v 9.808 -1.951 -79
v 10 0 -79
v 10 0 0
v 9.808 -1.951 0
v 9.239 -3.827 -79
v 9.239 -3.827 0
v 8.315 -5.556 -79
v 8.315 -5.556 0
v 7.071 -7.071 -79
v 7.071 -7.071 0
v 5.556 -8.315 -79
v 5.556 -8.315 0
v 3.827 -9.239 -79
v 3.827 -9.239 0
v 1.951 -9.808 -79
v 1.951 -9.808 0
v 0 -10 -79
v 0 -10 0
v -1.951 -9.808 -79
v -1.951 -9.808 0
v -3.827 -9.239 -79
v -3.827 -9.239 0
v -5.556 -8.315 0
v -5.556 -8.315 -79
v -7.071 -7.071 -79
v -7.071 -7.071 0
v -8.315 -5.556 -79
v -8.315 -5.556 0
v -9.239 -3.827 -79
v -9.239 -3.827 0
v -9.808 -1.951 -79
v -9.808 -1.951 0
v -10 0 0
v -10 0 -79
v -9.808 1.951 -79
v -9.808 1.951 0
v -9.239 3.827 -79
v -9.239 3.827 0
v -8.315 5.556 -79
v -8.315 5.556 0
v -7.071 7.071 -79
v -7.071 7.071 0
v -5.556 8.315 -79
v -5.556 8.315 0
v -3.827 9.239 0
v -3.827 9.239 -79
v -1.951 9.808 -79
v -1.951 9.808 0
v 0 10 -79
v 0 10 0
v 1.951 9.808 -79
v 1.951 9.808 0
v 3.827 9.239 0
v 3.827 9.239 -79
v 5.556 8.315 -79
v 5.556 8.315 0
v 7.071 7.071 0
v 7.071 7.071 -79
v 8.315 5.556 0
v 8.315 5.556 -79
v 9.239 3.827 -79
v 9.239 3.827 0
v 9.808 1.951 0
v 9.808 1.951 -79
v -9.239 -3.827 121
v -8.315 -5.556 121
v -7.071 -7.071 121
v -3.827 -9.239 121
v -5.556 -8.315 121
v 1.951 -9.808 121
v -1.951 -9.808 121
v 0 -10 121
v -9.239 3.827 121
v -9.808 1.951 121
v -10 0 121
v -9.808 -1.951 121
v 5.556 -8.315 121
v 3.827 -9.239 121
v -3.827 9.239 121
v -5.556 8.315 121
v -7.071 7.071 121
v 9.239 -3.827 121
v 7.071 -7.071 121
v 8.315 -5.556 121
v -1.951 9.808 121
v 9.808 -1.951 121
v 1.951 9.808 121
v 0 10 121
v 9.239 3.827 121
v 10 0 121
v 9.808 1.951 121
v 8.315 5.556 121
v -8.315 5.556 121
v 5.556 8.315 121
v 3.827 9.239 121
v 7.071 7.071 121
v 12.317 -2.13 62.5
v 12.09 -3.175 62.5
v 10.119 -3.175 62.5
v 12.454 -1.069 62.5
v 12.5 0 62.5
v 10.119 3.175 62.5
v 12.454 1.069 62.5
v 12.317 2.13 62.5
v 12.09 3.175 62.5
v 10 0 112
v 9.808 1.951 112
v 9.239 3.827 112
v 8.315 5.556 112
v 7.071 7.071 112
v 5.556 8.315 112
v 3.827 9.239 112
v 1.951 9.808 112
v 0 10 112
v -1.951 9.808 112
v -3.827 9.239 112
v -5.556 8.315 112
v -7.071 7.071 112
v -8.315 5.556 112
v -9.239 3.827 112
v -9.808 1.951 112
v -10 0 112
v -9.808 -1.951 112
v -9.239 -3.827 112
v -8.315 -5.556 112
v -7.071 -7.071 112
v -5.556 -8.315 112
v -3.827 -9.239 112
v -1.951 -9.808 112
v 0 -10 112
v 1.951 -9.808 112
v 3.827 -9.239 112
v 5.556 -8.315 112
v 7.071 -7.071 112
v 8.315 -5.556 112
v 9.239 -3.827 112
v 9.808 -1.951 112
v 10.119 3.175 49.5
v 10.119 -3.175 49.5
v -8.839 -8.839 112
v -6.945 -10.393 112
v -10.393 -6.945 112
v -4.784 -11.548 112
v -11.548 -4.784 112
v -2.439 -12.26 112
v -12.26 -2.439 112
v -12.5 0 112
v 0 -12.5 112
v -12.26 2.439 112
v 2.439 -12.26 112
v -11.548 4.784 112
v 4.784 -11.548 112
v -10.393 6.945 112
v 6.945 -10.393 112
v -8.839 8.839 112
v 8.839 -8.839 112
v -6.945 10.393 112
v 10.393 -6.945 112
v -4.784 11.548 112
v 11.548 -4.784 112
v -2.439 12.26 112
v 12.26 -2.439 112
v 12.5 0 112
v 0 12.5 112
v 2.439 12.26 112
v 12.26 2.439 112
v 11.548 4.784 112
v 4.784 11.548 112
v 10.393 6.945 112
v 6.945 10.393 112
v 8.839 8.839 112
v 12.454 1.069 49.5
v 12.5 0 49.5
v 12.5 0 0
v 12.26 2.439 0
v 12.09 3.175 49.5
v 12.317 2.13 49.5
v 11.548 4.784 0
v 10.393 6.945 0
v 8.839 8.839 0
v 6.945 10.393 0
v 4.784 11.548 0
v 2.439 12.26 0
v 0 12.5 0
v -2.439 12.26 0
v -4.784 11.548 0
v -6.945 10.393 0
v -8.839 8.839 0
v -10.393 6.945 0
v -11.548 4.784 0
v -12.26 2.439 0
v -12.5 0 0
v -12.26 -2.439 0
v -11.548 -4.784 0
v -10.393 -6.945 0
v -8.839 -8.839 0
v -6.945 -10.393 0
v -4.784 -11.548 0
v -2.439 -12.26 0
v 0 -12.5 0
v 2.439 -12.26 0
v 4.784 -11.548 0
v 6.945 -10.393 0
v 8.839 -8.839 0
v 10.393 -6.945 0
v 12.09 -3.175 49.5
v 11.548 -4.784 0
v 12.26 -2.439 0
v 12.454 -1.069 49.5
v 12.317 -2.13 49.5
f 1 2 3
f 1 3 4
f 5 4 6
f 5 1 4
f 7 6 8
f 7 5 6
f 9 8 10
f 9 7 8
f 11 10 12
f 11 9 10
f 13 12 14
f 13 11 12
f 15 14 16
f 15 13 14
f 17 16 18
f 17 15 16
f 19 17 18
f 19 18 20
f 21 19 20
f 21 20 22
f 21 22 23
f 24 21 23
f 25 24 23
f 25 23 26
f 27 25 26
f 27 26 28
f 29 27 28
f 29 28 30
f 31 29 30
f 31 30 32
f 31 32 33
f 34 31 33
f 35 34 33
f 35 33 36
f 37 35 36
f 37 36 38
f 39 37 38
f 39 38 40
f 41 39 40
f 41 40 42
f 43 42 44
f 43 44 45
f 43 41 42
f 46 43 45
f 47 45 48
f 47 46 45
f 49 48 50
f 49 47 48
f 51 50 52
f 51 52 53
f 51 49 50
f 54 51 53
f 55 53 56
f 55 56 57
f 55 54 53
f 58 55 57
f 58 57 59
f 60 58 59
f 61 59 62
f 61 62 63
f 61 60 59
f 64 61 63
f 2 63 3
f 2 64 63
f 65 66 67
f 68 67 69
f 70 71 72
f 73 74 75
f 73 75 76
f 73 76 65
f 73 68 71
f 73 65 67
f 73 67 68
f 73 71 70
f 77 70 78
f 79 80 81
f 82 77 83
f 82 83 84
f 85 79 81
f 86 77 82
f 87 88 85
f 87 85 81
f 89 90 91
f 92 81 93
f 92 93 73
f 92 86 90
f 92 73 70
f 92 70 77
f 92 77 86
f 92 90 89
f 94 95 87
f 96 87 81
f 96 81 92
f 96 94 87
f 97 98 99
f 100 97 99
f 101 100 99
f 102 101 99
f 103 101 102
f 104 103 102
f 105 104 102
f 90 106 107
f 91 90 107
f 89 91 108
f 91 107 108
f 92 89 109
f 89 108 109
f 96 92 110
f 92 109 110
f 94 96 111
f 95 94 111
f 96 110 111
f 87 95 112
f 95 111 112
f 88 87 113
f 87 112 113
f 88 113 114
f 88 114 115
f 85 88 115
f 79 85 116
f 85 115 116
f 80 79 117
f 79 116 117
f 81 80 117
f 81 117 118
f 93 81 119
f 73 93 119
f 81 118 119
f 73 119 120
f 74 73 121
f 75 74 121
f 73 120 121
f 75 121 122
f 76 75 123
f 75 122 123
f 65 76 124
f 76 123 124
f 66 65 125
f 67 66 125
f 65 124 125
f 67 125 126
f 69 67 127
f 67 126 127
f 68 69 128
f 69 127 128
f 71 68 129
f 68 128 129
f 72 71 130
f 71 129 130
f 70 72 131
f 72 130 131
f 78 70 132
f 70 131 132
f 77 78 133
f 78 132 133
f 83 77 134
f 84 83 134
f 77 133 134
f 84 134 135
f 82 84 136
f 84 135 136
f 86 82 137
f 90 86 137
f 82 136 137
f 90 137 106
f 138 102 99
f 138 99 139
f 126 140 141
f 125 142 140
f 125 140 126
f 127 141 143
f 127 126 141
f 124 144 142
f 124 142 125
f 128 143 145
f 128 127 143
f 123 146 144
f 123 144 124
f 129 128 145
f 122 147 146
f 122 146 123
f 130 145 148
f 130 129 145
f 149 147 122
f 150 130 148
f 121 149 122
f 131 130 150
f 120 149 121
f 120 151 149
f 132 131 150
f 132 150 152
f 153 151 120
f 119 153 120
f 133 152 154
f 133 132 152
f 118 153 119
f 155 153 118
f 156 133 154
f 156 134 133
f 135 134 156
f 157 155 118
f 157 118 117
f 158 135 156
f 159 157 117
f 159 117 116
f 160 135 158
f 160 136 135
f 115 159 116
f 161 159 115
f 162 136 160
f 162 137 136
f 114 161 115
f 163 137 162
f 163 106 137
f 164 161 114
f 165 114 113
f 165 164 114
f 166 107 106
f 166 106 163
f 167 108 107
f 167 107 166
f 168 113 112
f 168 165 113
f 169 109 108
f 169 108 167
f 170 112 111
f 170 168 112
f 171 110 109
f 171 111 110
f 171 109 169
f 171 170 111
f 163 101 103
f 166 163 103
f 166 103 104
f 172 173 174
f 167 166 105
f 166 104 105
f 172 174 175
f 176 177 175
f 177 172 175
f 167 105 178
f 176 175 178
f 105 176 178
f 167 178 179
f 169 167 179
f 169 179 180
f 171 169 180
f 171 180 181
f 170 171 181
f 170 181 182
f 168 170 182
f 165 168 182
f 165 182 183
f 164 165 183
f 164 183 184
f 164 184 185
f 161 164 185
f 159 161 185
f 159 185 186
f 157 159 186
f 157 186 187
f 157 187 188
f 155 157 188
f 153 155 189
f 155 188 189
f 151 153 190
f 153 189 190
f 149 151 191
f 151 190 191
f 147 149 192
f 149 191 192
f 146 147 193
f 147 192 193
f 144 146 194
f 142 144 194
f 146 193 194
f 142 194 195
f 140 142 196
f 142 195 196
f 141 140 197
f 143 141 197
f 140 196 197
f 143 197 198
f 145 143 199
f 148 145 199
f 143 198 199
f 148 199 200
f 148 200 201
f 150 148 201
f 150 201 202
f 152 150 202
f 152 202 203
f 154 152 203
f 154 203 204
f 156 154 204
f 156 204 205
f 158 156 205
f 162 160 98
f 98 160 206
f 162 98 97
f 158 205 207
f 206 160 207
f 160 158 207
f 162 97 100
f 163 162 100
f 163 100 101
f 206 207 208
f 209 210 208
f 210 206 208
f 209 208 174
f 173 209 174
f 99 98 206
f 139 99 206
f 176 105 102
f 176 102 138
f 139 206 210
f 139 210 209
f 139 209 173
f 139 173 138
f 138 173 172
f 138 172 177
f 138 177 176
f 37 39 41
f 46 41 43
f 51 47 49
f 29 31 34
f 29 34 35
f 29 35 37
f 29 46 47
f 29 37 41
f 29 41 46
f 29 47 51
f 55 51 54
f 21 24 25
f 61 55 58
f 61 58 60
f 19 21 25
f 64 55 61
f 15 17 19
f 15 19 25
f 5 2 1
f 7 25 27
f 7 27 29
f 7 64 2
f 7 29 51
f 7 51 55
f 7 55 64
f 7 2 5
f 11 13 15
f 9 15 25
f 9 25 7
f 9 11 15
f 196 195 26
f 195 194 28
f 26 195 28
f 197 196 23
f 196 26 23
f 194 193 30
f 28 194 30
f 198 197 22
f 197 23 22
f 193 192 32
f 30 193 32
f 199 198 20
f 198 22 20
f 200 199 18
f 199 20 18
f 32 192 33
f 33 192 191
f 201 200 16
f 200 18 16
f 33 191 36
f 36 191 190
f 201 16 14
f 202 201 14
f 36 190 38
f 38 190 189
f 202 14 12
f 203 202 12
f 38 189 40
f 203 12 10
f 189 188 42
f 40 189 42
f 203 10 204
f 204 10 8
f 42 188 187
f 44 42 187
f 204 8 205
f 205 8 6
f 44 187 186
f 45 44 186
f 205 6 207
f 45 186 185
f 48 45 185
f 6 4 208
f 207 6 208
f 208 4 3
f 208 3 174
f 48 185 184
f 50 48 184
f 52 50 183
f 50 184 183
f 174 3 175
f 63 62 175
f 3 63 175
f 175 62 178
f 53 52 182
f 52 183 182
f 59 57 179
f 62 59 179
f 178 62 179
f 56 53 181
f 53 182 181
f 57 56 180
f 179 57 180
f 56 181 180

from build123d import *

# Parameters (mm, degrees)
SKETCH1_R           = 12.5
BOSS_EXTRUDE1_DEPTH = 112
SKETCH2_R           = 10
BOSS_EXTRUDE2_DEPTH = 9
BOSS_EXTRUDE3_START = 9
SKETCH3_R           = 10
BOSS_EXTRUDE3_DEPTH = 9
SKETCH4_W           = 13
SKETCH4_H           = 6.35
CUT_EXTRUDE1_DEPTH  = 2.38125
BOSS_EXTRUDE5_START = 70
SKETCH6_R           = 10
BOSS_EXTRUDE5_DEPTH = 70


with BuildPart() as part:
    # Sketch1 → Boss-Extrude1 (new body)
    with BuildSketch(Plane.XY):
        Circle(SKETCH1_R)
    extrude(amount=BOSS_EXTRUDE1_DEPTH)

    # Sketch2 → Boss-Extrude2 (add)
    with BuildSketch(Plane.XY.offset(112)):
        Circle(SKETCH2_R)
    extrude(amount=BOSS_EXTRUDE2_DEPTH)

    # Sketch3 → Boss-Extrude3 (add)
    with BuildSketch(Plane(origin=(0, 0, 0), x_dir=(-1, 0, 0), z_dir=(0, 0, -1)).offset(BOSS_EXTRUDE3_START)):
        with Locations(Location((0, 0, 0), (0, 0, 180))):
            Circle(SKETCH3_R)
    extrude(amount=-BOSS_EXTRUDE3_DEPTH)

    # Sketch4 → Cut-Extrude1 (cut)
    with BuildSketch(Plane(origin=(12.5, 0, 0), x_dir=(0, 0, -1), z_dir=(1, 0, 0))):
        with Locations((-56, 0)):
            Rectangle(SKETCH4_W, SKETCH4_H)
    extrude(amount=-CUT_EXTRUDE1_DEPTH, mode=Mode.SUBTRACT)

    # Sketch6 → Boss-Extrude5 (add)
    with BuildSketch(Plane(origin=(0, 0, -9), x_dir=(-1, 0, 0), z_dir=(0, 0, -1)).offset(BOSS_EXTRUDE5_START)):
        with Locations(Location((0, 0, 0), (0, 0, 180))):
            Circle(SKETCH6_R)
    extrude(amount=-BOSS_EXTRUDE5_DEPTH)


solid = part.part
